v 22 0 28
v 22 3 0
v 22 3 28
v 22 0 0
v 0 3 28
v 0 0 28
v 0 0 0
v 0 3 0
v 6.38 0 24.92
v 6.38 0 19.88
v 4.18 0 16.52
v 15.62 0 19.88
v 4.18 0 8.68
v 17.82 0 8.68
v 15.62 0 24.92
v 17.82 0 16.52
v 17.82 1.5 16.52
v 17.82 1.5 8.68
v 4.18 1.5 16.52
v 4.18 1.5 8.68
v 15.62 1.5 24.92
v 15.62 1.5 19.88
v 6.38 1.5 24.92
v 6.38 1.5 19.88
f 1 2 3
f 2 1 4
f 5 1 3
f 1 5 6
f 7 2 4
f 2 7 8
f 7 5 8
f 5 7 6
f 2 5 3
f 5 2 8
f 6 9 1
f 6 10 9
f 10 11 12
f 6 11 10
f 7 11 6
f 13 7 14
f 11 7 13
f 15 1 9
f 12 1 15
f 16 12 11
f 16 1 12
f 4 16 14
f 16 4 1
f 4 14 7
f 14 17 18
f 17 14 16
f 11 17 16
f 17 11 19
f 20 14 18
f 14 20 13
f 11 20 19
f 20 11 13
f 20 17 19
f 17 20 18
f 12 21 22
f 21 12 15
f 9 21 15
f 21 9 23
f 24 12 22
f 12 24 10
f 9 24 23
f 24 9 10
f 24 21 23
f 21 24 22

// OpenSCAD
// DIN-rail retaining clip.
$fn = 60;
eps = 0.02;
clip_w = 22;
clip_h = 28;
clip_t = 3;
difference() { cube([clip_w,clip_t,clip_h]); translate([clip_w/2, -eps, clip_h*0.45]) cube([clip_w*0.62,clip_t+2*eps,clip_h*0.28],center=true); translate([clip_w/2, -eps, clip_h*0.8]) cube([clip_w*0.42,clip_t+2*eps,clip_h*0.18],center=true); }
